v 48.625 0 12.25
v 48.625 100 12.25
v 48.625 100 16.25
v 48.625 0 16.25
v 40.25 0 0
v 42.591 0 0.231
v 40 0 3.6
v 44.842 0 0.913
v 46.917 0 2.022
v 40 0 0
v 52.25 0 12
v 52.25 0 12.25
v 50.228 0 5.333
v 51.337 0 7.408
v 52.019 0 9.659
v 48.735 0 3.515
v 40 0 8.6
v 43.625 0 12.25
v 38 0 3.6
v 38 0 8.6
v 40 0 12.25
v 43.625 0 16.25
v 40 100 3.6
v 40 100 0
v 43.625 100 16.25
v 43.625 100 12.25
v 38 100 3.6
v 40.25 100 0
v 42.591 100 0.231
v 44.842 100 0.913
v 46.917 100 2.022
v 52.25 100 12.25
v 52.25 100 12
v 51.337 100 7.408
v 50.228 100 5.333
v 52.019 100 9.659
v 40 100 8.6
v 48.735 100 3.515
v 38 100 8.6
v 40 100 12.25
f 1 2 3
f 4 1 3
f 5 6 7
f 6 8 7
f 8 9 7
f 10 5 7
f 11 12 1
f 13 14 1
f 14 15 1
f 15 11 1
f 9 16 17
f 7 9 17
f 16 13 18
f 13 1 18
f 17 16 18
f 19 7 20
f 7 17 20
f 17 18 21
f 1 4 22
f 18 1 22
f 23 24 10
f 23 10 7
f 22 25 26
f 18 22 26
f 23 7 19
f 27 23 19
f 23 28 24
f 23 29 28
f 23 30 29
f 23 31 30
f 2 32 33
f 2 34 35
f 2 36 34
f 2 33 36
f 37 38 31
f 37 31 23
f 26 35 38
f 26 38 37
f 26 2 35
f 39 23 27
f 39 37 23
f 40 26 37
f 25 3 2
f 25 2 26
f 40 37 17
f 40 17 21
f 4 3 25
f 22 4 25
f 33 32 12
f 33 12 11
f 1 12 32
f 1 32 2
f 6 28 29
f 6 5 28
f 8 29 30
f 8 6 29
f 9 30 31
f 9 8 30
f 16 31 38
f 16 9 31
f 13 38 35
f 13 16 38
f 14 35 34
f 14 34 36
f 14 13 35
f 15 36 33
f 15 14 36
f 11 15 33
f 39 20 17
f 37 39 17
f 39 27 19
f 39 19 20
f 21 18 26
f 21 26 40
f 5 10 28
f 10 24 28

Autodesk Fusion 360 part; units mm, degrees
sketch "Sketch1" plane through (0, 0, 52.25) normal (0, 0, 1) x (-1, 0, 0)
  line L0 (12.25, -100) -> (12.25, 0)
  line L1 (12.25, 0) -> (0, 0)
  line L2 (0, 0) -> (0, -100)
  line L3 (0, -100) -> (12.25, -100)
  line L4 (0, 0) -> (12.25, 0) construction
  line L5 (6.125, 0) -> (8.625, 0) construction
  line L6 (6.125, 0) -> (3.625, 0) construction
  line L7 (3.625, 0) -> (8.625, 0) construction
  line L8 (3.625, 0) -> (8.625, 0)
  line L9 (8.625, 0) -> (8.625, -100)
  line L10 (8.625, -100) -> (3.625, -100)
  line L11 (3.625, -100) -> (3.625, 0)
  dimension "d3" = 5
sketch "Sketch2" plane through (0, 100, 0) normal (0, 1, 0) x (-1, 0, 0)
  line L0 (-4, 8.6) -> (-4, 3.6)
  line L1 (-4, 3.6) -> (8.5, 3.6)
  line L2 (8.5, 3.6) -> (8.5, 10.6)
  line L3 (8.5, 10.6) -> (3.5, 10.6)
  line L4 (3.5, 10.6) -> (3.5, 8.6)
  line L5 (3.5, 8.6) -> (-4, 8.6)
sketch "Sketch3" plane through (0, 100, 0) normal (0, 1, 0) x (-1, 0, 0)
  line L0 (-43.625, 52.25) -> (-43.625, 50.25)
  line L1 (-43.625, 50.25) -> (-48.625, 50.25)
  line L2 (-48.625, 50.25) -> (-48.625, 52.25)
  line L3 (-48.625, 52.25) -> (-52.25, 52.25)
  line L4 (-52.25, 52.25) -> (-52.25, 12.25)
  line L5 (-52.25, 12.25) -> (-48.625, 12.25)
  line L6 (-48.625, 12.25) -> (-48.625, 16.25)
  line L7 (-48.625, 16.25) -> (-43.625, 16.25)
  line L8 (-43.625, 16.25) -> (-43.625, 12.25)
  line L9 (-43.625, 12.25) -> (-40, 12.25)
  line L10 (-40, 12.25) -> (-40, 52.25)
  line L11 (-40, 52.25) -> (-43.625, 52.25)
  line L12 (-40, 0) -> (-56, 0) construction
  line L13 (-52.25, 12.25) -> (-48.625, 12.25)
  line L14 (-48.625, 16.25) -> (-48.625, 12.25)
  line L15 (-43.625, 16.25) -> (-48.625, 16.25)
  line L16 (-43.625, 12.25) -> (-43.625, 16.25)
  line L17 (-40, 12.25) -> (-43.625, 12.25)
  line L18 (-40, 8.6) -> (-40, 12.25)
  line L19 (-38, 8.6) -> (-40, 8.6)
  line L20 (-38, 3.6) -> (-38, 8.6)
  line L21 (-40, 3.6) -> (-38, 3.6)
  line L22 (-40, 0) -> (-40, 3.6)
  line L23 (-40, 0) -> (-52.25, 0)
  line L24 (-52.25, 12.25) -> (-52.25, 0)
extrude "Extrude3" add sketch "Sketch3" against normal blind 100 contours L5 L6 L7 L8 L9 L13 L14 L15 L16 L17 L18 L19 L20 L21 L22 L23 L24
fillet "Fillet1" radius 12 1 edges at (52.25, 50, 0)
